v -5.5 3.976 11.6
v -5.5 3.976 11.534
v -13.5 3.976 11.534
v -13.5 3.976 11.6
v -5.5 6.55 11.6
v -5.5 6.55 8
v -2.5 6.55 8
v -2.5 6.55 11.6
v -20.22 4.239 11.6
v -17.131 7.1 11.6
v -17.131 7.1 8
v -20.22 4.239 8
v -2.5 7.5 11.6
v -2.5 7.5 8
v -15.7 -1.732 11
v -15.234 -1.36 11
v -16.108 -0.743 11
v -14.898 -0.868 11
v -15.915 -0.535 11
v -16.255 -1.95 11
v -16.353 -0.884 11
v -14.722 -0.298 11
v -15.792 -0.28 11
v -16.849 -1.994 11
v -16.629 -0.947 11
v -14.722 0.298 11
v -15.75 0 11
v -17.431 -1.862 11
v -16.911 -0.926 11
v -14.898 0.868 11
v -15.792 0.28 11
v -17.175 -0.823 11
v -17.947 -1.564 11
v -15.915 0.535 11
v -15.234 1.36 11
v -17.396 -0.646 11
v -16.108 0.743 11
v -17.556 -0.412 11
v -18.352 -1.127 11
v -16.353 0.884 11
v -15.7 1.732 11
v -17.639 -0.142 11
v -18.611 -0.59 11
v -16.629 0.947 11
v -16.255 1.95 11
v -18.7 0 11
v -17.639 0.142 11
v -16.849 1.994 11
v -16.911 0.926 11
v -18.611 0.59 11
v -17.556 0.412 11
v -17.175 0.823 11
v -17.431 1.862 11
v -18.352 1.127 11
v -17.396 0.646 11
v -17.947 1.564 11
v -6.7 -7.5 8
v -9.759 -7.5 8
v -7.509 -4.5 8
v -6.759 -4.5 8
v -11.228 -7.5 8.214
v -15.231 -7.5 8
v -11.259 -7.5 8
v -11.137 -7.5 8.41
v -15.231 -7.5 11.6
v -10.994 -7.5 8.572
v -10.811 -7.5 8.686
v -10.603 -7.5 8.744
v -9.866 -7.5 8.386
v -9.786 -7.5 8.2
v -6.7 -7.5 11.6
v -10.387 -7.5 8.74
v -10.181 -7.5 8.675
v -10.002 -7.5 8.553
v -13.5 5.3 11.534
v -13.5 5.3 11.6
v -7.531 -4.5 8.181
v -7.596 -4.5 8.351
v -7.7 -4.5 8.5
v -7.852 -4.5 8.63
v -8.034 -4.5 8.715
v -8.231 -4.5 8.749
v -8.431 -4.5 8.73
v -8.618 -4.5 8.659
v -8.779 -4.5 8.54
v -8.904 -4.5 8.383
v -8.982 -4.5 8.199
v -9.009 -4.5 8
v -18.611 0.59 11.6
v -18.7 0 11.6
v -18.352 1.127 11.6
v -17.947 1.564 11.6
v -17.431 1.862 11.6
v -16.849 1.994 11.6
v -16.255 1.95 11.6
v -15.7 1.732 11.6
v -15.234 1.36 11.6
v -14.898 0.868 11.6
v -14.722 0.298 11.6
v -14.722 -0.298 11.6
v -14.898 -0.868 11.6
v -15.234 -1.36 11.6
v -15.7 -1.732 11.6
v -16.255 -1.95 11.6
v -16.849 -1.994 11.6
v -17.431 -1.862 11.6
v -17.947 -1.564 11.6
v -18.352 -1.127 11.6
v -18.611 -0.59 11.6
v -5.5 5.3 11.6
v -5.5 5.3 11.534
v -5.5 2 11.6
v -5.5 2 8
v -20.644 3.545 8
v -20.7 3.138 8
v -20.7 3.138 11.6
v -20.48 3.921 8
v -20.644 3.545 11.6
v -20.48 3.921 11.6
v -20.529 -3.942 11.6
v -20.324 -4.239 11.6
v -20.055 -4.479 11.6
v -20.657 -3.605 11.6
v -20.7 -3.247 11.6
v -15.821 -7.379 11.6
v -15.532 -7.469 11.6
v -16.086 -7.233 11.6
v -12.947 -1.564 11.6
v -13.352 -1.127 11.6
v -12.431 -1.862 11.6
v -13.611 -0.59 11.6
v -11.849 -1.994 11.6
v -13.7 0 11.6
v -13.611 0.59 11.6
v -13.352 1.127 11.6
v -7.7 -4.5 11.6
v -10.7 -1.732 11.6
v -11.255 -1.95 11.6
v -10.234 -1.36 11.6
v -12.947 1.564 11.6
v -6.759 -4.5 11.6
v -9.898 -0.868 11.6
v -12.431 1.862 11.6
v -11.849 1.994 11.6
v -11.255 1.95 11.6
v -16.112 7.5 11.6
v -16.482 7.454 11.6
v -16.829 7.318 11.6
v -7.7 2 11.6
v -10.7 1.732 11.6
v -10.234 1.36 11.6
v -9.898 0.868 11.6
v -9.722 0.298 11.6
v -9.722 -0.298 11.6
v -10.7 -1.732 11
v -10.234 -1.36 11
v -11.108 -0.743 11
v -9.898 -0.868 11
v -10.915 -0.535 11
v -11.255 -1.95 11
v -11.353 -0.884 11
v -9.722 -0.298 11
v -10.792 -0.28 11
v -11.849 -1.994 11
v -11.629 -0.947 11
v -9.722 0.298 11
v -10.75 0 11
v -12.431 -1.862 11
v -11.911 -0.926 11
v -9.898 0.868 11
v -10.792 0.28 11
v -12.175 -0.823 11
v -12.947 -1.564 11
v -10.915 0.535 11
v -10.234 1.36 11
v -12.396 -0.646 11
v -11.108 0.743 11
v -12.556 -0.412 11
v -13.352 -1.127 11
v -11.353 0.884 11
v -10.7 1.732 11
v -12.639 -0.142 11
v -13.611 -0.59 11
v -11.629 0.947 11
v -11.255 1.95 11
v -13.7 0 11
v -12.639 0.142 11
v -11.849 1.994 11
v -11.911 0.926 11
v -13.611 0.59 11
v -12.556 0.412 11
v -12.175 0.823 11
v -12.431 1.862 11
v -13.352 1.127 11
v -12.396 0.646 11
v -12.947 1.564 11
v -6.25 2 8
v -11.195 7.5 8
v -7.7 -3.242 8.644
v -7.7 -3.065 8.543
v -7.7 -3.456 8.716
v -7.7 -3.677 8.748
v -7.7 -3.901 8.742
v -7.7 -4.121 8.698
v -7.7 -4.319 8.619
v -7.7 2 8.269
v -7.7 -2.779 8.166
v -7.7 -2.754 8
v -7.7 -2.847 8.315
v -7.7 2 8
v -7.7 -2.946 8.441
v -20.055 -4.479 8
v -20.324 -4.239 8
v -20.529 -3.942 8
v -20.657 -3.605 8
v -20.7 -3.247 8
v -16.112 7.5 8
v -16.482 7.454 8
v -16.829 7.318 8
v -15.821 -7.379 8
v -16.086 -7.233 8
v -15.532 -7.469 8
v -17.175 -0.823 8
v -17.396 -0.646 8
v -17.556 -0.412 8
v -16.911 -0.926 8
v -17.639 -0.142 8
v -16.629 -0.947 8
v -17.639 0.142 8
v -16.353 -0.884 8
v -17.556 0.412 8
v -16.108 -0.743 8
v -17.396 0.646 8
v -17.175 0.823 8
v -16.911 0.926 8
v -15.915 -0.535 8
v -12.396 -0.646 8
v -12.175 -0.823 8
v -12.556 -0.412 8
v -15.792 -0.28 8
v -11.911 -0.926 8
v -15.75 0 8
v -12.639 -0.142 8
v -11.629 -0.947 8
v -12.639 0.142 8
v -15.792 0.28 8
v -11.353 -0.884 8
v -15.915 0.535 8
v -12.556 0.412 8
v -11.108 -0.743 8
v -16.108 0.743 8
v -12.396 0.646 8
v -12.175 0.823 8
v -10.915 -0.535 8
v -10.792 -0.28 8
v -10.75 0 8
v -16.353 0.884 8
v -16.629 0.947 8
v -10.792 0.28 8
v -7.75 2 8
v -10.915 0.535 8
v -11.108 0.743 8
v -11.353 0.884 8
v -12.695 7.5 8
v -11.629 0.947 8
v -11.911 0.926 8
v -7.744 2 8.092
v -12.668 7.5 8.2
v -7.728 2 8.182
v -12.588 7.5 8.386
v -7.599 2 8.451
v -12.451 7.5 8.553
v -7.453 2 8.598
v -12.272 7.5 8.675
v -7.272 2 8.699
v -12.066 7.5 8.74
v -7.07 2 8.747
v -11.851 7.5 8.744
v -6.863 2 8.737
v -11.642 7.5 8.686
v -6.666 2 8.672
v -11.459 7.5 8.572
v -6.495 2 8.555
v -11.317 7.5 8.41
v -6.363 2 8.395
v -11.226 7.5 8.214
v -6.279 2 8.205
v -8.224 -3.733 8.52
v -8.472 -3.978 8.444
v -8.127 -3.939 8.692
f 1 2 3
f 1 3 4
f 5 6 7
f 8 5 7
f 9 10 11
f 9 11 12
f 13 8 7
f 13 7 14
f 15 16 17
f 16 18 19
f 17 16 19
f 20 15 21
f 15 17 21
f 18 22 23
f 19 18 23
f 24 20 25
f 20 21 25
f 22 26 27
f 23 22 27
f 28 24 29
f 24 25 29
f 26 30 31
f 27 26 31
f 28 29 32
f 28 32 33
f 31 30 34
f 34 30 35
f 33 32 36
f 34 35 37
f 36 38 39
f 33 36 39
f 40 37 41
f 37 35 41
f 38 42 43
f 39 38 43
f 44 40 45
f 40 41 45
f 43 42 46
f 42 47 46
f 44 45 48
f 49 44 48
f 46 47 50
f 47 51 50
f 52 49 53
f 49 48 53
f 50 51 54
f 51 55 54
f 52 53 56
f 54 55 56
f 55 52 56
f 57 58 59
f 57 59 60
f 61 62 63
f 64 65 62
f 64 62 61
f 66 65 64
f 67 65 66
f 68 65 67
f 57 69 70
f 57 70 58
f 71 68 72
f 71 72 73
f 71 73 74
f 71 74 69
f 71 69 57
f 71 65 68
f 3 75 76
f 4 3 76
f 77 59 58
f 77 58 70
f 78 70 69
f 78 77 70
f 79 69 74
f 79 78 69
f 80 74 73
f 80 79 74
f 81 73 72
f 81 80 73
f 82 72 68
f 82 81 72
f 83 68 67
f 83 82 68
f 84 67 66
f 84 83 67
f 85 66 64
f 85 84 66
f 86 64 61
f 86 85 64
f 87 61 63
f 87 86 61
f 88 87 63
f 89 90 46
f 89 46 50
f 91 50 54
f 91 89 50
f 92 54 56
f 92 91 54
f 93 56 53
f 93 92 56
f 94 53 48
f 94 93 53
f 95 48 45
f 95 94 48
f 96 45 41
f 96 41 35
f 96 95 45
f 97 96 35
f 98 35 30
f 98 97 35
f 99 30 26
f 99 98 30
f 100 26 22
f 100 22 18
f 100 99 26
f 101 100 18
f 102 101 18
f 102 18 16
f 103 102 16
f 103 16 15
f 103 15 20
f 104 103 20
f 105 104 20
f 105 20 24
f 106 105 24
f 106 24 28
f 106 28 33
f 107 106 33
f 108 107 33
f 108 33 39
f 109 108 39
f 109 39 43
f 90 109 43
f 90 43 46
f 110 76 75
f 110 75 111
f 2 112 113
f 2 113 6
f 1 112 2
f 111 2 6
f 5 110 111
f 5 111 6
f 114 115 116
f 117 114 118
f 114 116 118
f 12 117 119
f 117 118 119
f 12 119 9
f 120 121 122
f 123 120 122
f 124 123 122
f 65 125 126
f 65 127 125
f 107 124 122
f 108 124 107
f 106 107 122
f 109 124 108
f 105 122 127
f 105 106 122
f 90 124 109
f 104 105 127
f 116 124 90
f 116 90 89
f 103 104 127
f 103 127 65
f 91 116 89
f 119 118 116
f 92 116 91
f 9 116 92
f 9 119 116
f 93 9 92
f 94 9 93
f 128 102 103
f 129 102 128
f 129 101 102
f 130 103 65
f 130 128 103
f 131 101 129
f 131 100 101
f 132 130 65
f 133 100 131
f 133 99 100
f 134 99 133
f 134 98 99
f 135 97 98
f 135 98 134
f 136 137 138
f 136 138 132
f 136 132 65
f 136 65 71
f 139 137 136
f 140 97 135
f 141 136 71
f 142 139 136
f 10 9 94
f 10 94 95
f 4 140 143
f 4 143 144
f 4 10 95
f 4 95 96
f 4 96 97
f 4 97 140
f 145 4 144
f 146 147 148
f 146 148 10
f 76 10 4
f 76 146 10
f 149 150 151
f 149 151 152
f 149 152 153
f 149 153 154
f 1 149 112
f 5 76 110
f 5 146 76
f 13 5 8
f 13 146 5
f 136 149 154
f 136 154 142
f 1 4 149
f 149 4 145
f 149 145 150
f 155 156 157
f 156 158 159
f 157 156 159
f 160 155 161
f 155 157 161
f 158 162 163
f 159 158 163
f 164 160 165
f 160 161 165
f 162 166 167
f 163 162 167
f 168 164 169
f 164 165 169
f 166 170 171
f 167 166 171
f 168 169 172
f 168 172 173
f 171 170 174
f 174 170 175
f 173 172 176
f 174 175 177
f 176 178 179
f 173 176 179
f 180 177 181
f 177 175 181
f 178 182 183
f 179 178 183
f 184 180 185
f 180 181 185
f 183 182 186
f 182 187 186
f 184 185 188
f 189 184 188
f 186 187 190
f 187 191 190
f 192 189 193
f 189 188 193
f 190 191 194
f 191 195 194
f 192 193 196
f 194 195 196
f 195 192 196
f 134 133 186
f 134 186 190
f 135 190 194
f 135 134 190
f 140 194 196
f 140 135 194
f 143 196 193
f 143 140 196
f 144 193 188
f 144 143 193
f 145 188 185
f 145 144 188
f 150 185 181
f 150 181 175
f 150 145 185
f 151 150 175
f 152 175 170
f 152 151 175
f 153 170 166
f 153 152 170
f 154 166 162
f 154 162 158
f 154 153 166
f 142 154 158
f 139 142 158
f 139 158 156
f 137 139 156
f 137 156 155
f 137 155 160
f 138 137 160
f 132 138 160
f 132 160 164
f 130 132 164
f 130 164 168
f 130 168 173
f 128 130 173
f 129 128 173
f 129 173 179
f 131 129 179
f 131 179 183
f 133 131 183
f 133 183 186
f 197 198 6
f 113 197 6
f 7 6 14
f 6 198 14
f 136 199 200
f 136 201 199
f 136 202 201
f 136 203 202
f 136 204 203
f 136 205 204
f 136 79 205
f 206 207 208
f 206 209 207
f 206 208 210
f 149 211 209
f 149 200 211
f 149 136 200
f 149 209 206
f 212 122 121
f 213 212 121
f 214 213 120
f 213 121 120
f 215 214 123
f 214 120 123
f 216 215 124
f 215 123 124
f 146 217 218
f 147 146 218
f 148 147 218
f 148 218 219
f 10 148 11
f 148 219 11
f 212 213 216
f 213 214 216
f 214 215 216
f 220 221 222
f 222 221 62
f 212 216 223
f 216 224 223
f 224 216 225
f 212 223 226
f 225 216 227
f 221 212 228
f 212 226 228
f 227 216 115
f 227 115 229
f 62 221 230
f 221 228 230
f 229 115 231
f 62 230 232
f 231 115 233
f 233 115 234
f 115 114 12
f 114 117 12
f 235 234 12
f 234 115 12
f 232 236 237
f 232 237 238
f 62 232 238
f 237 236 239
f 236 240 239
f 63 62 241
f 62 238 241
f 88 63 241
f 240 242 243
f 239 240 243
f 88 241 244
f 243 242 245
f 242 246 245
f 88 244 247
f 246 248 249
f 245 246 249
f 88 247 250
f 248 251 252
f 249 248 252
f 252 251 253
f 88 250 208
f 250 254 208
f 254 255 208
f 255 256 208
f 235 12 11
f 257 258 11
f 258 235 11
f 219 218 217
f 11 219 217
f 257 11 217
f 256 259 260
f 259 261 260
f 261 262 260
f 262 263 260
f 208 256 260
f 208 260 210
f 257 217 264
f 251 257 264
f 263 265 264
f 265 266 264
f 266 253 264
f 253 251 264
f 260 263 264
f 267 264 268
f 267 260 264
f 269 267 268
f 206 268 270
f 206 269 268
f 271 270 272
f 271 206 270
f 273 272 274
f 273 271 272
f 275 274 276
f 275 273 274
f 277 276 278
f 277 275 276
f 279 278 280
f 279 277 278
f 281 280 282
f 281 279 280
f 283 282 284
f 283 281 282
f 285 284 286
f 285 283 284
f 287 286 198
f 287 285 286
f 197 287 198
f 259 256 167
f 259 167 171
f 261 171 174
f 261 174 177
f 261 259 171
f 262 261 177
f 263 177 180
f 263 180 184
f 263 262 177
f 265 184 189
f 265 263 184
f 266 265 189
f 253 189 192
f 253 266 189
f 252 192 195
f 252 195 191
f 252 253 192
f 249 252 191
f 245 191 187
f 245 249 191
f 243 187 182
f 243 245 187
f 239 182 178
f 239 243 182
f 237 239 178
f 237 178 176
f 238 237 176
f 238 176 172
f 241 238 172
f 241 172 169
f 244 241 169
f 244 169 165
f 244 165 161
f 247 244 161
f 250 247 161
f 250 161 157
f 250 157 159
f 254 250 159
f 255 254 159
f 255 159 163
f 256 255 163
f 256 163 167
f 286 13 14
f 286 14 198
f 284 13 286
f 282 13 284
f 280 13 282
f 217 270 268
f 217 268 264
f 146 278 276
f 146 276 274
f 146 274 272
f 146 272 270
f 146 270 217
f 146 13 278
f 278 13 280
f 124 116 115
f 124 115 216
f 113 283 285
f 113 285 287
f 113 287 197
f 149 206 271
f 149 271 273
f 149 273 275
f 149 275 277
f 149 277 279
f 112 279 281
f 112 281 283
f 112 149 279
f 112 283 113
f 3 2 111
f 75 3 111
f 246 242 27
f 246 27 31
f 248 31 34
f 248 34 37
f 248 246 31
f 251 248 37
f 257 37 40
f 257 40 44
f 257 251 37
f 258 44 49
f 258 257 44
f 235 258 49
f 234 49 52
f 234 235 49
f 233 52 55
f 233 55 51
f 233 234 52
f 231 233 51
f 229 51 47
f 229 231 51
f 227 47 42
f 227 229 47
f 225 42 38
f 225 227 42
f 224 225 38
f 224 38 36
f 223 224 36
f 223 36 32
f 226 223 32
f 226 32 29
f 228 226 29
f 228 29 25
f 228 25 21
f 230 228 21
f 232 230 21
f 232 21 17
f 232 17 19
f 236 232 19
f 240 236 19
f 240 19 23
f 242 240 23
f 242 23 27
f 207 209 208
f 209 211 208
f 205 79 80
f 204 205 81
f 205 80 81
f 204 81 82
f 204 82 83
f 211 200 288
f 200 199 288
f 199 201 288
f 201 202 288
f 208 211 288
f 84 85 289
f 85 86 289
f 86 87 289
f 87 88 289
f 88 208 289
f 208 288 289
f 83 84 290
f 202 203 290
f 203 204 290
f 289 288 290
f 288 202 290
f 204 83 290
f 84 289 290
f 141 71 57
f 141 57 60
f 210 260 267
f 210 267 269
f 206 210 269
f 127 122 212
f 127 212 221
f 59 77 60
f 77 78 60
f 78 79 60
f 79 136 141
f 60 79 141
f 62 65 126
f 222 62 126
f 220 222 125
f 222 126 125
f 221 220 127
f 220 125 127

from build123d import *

# Parameters (mm, degrees)
BOSS_EXTRUDE1_DEPTH      = 2
BOSS_EXTRUDE2_DEPTH      = 6
SKETCH24_R               = 3.9
BOSS_EXTRUDE5_DEPTH      = 2.3
SKETCH30_W               = 2.408612022
SKETCH30_H               = 1.324178481
CUT_EXTRUDE12_DEPTH      = 8
CUT_EXTRUDE11_DEPTH      = 23.432788503
FILLET1_R                = 1.5
SKETCH34_R               = 0.75
CUT_EXTRUDE13_DEPTH      = 8
SKETCH35_R               = 0.75
CUT_EXTRUDE14_DEPTH      = 3
CUT_EXTRUDE14_DEPTH_BACK = 8
SKETCH36_R               = 0.95
CUT_EXTRUDE15_DEPTH      = 8
SKETCH37_R               = 2
CUT_EXTRUDE16_DEPTH      = 5
SKETCH38_W               = 3
SKETCH38_H               = 1.25
CUT_EXTRUDE17_DEPTH      = 3.6


with BuildPart() as part:
    # Sketch2 → Boss-Extrude1 (new body)
    with BuildSketch(Plane.XY):
        with BuildLine():
            Line((-2.5, 7.5), (-16.7, 7.5))
            Line((-16.7, 7.5), (-20.7, 3.793442666))
            Line((-20.7, 3.793442666), (-20.7, -4.031648778))
            Line((-20.7, -4.031648778), (-15.7, -7.5))
            Line((-15.7, -7.5), (-6.7, -7.5))
            Line((-6.7, -7.5), (-4.2, -5.6))
            ThreePointArc((-4.2, -5.6), (3.130495168, -6.260990337), (7, 0))
            ThreePointArc((7, 0), (4.949747468, 4.949747468), (0, 7))
            Line((0, 7), (0, 7.5))
            Line((0, 7.5), (-2.5, 7.5))
        make_face()
    extrude(amount=BOSS_EXTRUDE1_DEPTH)

    # Sketch4 → Boss-Extrude2 (add)
    with BuildSketch(Plane.XY.offset(2)):
        Polygon((-15.7, -7.5), (-6.7, -7.5), (-6.759079174, -4.5), (-7.7, -4.5), (-7.7, 2), (-5.5, 2), (-5.5, 5.3), (-2.5, 5.3), (-2.5, 7.5), (-16.7, 7.5), (-20.7, 3.793442666), (-20.7, -4.031648778), align=None)
    extrude(amount=BOSS_EXTRUDE2_DEPTH)

    # Sketch24 → Boss-Extrude5 (add)
    with BuildSketch(Plane.XY.offset(2)):
        Circle(SKETCH24_R)
    extrude(amount=BOSS_EXTRUDE5_DEPTH)

    # Sketch30 → Cut-Extrude12 (cut)
    with BuildSketch(Plane(origin=(-5.5, 0, 0), x_dir=(0, 0, -1), z_dir=(1, 0, 0))):
        with Locations((-3.261593395, 4.63791076)):
            Rectangle(SKETCH30_W, SKETCH30_H)
    extrude(amount=-CUT_EXTRUDE12_DEPTH, mode=Mode.SUBTRACT)

    # Sketch28 → Cut-Extrude11 (cut, through all)
    with BuildSketch(Plane.XY.offset(4.3)):
        with BuildLine():
            Line((-1, 1.732050808), (-1, -1.732050808))
            ThreePointArc((-1, -1.732050808), (2, 0), (-1, 1.732050808))
        make_face()
    extrude(amount=-CUT_EXTRUDE11_DEPTH, mode=Mode.SUBTRACT)

    # Fillet1
    fillet1_edges = [part.edges().sort_by_distance(p)[0] for p in [
        (-11.2, -7.5, 0),
        (-8.35, 7.5, 0),
        (-18.7, 5.646721333, 0),
        (-18.2, -5.765824389, 0),
        (-20.7, -0.119103056, 0),
        (-15.7, -7.5, 4),
        (-20.7, -4.031648778, 4),
        (-20.7, 3.793442666, 4),
        (-16.7, 7.5, 4),
    ]]
    fillet(fillet1_edges, radius=FILLET1_R)

    # Sketch34 → Cut-Extrude13 (cut, along a direction that is not the sketch's normal)
    with BuildSketch(Plane.XZ.offset(-2)):
        with Locations((-7, 8)):
            Circle(SKETCH34_R)
    extrude(amount=-CUT_EXTRUDE13_DEPTH, dir=(0.6685833876565112, -0.7436371788377336, 0), mode=Mode.SUBTRACT)

    # Sketch35 → Cut-Extrude14 (cut, two sides, along a direction that is not the sketch's normal)
    with BuildSketch(Plane(origin=(0, -4.5, 0), x_dir=(1, 0, 0), z_dir=(0, 1, 0))) as cut_extrude14_sk:
        with Locations((-8.259079174, -8)):
            Circle(SKETCH35_R)
    extrude(amount=CUT_EXTRUDE14_DEPTH, dir=(0.5999194182208608, 0.8000604299935998, 0), mode=Mode.SUBTRACT)
    extrude(cut_extrude14_sk.sketch, amount=-CUT_EXTRUDE14_DEPTH_BACK, dir=(0.5999194182208608, 0.8000604299935998, 0), mode=Mode.SUBTRACT)

    # Sketch36 → Cut-Extrude15 (cut)
    with BuildSketch(Plane.XY.offset(8)):
        with Locations((-11.7, 0)):
            Circle(SKETCH36_R)
        with Locations((-16.7, 0)):
            Circle(SKETCH36_R)
    extrude(amount=-CUT_EXTRUDE15_DEPTH, mode=Mode.SUBTRACT)

    # Sketch37 → Cut-Extrude16 (cut)
    with BuildSketch(Plane(origin=(0, 0, 0), x_dir=(-1, 0, 0), z_dir=(0, 0, -1))):
        with Locations((11.7, 0)):
            Circle(SKETCH37_R)
        with Locations((16.7, 0)):
            Circle(SKETCH37_R)
    extrude(amount=-CUT_EXTRUDE16_DEPTH, mode=Mode.SUBTRACT)

    # Sketch38 → Cut-Extrude17 (cut)
    with BuildSketch(Plane.XY.offset(8)):
        with Locations((-4, 5.925)):
            Rectangle(SKETCH38_W, SKETCH38_H)
    extrude(amount=-CUT_EXTRUDE17_DEPTH, mode=Mode.SUBTRACT)


with BuildPart() as body_2:
    # Split2: the piece on the far side of the plane
    add(part.part)
    split(bisect_by=Plane.XY.offset(4.4), keep=Keep.BOTTOM)


with BuildPart() as part_1:
    add(part.part)

    # Split2
    split(bisect_by=Plane.XY.offset(4.4), keep=Keep.TOP)


with BuildPart() as body_3:
    # Mirror2: read off the stored shape, not the designer's step
    # Mirror2: mirrored copy
    add(part_1.part.mirror(Plane.XY.offset(8)))


solid = body_3.part
